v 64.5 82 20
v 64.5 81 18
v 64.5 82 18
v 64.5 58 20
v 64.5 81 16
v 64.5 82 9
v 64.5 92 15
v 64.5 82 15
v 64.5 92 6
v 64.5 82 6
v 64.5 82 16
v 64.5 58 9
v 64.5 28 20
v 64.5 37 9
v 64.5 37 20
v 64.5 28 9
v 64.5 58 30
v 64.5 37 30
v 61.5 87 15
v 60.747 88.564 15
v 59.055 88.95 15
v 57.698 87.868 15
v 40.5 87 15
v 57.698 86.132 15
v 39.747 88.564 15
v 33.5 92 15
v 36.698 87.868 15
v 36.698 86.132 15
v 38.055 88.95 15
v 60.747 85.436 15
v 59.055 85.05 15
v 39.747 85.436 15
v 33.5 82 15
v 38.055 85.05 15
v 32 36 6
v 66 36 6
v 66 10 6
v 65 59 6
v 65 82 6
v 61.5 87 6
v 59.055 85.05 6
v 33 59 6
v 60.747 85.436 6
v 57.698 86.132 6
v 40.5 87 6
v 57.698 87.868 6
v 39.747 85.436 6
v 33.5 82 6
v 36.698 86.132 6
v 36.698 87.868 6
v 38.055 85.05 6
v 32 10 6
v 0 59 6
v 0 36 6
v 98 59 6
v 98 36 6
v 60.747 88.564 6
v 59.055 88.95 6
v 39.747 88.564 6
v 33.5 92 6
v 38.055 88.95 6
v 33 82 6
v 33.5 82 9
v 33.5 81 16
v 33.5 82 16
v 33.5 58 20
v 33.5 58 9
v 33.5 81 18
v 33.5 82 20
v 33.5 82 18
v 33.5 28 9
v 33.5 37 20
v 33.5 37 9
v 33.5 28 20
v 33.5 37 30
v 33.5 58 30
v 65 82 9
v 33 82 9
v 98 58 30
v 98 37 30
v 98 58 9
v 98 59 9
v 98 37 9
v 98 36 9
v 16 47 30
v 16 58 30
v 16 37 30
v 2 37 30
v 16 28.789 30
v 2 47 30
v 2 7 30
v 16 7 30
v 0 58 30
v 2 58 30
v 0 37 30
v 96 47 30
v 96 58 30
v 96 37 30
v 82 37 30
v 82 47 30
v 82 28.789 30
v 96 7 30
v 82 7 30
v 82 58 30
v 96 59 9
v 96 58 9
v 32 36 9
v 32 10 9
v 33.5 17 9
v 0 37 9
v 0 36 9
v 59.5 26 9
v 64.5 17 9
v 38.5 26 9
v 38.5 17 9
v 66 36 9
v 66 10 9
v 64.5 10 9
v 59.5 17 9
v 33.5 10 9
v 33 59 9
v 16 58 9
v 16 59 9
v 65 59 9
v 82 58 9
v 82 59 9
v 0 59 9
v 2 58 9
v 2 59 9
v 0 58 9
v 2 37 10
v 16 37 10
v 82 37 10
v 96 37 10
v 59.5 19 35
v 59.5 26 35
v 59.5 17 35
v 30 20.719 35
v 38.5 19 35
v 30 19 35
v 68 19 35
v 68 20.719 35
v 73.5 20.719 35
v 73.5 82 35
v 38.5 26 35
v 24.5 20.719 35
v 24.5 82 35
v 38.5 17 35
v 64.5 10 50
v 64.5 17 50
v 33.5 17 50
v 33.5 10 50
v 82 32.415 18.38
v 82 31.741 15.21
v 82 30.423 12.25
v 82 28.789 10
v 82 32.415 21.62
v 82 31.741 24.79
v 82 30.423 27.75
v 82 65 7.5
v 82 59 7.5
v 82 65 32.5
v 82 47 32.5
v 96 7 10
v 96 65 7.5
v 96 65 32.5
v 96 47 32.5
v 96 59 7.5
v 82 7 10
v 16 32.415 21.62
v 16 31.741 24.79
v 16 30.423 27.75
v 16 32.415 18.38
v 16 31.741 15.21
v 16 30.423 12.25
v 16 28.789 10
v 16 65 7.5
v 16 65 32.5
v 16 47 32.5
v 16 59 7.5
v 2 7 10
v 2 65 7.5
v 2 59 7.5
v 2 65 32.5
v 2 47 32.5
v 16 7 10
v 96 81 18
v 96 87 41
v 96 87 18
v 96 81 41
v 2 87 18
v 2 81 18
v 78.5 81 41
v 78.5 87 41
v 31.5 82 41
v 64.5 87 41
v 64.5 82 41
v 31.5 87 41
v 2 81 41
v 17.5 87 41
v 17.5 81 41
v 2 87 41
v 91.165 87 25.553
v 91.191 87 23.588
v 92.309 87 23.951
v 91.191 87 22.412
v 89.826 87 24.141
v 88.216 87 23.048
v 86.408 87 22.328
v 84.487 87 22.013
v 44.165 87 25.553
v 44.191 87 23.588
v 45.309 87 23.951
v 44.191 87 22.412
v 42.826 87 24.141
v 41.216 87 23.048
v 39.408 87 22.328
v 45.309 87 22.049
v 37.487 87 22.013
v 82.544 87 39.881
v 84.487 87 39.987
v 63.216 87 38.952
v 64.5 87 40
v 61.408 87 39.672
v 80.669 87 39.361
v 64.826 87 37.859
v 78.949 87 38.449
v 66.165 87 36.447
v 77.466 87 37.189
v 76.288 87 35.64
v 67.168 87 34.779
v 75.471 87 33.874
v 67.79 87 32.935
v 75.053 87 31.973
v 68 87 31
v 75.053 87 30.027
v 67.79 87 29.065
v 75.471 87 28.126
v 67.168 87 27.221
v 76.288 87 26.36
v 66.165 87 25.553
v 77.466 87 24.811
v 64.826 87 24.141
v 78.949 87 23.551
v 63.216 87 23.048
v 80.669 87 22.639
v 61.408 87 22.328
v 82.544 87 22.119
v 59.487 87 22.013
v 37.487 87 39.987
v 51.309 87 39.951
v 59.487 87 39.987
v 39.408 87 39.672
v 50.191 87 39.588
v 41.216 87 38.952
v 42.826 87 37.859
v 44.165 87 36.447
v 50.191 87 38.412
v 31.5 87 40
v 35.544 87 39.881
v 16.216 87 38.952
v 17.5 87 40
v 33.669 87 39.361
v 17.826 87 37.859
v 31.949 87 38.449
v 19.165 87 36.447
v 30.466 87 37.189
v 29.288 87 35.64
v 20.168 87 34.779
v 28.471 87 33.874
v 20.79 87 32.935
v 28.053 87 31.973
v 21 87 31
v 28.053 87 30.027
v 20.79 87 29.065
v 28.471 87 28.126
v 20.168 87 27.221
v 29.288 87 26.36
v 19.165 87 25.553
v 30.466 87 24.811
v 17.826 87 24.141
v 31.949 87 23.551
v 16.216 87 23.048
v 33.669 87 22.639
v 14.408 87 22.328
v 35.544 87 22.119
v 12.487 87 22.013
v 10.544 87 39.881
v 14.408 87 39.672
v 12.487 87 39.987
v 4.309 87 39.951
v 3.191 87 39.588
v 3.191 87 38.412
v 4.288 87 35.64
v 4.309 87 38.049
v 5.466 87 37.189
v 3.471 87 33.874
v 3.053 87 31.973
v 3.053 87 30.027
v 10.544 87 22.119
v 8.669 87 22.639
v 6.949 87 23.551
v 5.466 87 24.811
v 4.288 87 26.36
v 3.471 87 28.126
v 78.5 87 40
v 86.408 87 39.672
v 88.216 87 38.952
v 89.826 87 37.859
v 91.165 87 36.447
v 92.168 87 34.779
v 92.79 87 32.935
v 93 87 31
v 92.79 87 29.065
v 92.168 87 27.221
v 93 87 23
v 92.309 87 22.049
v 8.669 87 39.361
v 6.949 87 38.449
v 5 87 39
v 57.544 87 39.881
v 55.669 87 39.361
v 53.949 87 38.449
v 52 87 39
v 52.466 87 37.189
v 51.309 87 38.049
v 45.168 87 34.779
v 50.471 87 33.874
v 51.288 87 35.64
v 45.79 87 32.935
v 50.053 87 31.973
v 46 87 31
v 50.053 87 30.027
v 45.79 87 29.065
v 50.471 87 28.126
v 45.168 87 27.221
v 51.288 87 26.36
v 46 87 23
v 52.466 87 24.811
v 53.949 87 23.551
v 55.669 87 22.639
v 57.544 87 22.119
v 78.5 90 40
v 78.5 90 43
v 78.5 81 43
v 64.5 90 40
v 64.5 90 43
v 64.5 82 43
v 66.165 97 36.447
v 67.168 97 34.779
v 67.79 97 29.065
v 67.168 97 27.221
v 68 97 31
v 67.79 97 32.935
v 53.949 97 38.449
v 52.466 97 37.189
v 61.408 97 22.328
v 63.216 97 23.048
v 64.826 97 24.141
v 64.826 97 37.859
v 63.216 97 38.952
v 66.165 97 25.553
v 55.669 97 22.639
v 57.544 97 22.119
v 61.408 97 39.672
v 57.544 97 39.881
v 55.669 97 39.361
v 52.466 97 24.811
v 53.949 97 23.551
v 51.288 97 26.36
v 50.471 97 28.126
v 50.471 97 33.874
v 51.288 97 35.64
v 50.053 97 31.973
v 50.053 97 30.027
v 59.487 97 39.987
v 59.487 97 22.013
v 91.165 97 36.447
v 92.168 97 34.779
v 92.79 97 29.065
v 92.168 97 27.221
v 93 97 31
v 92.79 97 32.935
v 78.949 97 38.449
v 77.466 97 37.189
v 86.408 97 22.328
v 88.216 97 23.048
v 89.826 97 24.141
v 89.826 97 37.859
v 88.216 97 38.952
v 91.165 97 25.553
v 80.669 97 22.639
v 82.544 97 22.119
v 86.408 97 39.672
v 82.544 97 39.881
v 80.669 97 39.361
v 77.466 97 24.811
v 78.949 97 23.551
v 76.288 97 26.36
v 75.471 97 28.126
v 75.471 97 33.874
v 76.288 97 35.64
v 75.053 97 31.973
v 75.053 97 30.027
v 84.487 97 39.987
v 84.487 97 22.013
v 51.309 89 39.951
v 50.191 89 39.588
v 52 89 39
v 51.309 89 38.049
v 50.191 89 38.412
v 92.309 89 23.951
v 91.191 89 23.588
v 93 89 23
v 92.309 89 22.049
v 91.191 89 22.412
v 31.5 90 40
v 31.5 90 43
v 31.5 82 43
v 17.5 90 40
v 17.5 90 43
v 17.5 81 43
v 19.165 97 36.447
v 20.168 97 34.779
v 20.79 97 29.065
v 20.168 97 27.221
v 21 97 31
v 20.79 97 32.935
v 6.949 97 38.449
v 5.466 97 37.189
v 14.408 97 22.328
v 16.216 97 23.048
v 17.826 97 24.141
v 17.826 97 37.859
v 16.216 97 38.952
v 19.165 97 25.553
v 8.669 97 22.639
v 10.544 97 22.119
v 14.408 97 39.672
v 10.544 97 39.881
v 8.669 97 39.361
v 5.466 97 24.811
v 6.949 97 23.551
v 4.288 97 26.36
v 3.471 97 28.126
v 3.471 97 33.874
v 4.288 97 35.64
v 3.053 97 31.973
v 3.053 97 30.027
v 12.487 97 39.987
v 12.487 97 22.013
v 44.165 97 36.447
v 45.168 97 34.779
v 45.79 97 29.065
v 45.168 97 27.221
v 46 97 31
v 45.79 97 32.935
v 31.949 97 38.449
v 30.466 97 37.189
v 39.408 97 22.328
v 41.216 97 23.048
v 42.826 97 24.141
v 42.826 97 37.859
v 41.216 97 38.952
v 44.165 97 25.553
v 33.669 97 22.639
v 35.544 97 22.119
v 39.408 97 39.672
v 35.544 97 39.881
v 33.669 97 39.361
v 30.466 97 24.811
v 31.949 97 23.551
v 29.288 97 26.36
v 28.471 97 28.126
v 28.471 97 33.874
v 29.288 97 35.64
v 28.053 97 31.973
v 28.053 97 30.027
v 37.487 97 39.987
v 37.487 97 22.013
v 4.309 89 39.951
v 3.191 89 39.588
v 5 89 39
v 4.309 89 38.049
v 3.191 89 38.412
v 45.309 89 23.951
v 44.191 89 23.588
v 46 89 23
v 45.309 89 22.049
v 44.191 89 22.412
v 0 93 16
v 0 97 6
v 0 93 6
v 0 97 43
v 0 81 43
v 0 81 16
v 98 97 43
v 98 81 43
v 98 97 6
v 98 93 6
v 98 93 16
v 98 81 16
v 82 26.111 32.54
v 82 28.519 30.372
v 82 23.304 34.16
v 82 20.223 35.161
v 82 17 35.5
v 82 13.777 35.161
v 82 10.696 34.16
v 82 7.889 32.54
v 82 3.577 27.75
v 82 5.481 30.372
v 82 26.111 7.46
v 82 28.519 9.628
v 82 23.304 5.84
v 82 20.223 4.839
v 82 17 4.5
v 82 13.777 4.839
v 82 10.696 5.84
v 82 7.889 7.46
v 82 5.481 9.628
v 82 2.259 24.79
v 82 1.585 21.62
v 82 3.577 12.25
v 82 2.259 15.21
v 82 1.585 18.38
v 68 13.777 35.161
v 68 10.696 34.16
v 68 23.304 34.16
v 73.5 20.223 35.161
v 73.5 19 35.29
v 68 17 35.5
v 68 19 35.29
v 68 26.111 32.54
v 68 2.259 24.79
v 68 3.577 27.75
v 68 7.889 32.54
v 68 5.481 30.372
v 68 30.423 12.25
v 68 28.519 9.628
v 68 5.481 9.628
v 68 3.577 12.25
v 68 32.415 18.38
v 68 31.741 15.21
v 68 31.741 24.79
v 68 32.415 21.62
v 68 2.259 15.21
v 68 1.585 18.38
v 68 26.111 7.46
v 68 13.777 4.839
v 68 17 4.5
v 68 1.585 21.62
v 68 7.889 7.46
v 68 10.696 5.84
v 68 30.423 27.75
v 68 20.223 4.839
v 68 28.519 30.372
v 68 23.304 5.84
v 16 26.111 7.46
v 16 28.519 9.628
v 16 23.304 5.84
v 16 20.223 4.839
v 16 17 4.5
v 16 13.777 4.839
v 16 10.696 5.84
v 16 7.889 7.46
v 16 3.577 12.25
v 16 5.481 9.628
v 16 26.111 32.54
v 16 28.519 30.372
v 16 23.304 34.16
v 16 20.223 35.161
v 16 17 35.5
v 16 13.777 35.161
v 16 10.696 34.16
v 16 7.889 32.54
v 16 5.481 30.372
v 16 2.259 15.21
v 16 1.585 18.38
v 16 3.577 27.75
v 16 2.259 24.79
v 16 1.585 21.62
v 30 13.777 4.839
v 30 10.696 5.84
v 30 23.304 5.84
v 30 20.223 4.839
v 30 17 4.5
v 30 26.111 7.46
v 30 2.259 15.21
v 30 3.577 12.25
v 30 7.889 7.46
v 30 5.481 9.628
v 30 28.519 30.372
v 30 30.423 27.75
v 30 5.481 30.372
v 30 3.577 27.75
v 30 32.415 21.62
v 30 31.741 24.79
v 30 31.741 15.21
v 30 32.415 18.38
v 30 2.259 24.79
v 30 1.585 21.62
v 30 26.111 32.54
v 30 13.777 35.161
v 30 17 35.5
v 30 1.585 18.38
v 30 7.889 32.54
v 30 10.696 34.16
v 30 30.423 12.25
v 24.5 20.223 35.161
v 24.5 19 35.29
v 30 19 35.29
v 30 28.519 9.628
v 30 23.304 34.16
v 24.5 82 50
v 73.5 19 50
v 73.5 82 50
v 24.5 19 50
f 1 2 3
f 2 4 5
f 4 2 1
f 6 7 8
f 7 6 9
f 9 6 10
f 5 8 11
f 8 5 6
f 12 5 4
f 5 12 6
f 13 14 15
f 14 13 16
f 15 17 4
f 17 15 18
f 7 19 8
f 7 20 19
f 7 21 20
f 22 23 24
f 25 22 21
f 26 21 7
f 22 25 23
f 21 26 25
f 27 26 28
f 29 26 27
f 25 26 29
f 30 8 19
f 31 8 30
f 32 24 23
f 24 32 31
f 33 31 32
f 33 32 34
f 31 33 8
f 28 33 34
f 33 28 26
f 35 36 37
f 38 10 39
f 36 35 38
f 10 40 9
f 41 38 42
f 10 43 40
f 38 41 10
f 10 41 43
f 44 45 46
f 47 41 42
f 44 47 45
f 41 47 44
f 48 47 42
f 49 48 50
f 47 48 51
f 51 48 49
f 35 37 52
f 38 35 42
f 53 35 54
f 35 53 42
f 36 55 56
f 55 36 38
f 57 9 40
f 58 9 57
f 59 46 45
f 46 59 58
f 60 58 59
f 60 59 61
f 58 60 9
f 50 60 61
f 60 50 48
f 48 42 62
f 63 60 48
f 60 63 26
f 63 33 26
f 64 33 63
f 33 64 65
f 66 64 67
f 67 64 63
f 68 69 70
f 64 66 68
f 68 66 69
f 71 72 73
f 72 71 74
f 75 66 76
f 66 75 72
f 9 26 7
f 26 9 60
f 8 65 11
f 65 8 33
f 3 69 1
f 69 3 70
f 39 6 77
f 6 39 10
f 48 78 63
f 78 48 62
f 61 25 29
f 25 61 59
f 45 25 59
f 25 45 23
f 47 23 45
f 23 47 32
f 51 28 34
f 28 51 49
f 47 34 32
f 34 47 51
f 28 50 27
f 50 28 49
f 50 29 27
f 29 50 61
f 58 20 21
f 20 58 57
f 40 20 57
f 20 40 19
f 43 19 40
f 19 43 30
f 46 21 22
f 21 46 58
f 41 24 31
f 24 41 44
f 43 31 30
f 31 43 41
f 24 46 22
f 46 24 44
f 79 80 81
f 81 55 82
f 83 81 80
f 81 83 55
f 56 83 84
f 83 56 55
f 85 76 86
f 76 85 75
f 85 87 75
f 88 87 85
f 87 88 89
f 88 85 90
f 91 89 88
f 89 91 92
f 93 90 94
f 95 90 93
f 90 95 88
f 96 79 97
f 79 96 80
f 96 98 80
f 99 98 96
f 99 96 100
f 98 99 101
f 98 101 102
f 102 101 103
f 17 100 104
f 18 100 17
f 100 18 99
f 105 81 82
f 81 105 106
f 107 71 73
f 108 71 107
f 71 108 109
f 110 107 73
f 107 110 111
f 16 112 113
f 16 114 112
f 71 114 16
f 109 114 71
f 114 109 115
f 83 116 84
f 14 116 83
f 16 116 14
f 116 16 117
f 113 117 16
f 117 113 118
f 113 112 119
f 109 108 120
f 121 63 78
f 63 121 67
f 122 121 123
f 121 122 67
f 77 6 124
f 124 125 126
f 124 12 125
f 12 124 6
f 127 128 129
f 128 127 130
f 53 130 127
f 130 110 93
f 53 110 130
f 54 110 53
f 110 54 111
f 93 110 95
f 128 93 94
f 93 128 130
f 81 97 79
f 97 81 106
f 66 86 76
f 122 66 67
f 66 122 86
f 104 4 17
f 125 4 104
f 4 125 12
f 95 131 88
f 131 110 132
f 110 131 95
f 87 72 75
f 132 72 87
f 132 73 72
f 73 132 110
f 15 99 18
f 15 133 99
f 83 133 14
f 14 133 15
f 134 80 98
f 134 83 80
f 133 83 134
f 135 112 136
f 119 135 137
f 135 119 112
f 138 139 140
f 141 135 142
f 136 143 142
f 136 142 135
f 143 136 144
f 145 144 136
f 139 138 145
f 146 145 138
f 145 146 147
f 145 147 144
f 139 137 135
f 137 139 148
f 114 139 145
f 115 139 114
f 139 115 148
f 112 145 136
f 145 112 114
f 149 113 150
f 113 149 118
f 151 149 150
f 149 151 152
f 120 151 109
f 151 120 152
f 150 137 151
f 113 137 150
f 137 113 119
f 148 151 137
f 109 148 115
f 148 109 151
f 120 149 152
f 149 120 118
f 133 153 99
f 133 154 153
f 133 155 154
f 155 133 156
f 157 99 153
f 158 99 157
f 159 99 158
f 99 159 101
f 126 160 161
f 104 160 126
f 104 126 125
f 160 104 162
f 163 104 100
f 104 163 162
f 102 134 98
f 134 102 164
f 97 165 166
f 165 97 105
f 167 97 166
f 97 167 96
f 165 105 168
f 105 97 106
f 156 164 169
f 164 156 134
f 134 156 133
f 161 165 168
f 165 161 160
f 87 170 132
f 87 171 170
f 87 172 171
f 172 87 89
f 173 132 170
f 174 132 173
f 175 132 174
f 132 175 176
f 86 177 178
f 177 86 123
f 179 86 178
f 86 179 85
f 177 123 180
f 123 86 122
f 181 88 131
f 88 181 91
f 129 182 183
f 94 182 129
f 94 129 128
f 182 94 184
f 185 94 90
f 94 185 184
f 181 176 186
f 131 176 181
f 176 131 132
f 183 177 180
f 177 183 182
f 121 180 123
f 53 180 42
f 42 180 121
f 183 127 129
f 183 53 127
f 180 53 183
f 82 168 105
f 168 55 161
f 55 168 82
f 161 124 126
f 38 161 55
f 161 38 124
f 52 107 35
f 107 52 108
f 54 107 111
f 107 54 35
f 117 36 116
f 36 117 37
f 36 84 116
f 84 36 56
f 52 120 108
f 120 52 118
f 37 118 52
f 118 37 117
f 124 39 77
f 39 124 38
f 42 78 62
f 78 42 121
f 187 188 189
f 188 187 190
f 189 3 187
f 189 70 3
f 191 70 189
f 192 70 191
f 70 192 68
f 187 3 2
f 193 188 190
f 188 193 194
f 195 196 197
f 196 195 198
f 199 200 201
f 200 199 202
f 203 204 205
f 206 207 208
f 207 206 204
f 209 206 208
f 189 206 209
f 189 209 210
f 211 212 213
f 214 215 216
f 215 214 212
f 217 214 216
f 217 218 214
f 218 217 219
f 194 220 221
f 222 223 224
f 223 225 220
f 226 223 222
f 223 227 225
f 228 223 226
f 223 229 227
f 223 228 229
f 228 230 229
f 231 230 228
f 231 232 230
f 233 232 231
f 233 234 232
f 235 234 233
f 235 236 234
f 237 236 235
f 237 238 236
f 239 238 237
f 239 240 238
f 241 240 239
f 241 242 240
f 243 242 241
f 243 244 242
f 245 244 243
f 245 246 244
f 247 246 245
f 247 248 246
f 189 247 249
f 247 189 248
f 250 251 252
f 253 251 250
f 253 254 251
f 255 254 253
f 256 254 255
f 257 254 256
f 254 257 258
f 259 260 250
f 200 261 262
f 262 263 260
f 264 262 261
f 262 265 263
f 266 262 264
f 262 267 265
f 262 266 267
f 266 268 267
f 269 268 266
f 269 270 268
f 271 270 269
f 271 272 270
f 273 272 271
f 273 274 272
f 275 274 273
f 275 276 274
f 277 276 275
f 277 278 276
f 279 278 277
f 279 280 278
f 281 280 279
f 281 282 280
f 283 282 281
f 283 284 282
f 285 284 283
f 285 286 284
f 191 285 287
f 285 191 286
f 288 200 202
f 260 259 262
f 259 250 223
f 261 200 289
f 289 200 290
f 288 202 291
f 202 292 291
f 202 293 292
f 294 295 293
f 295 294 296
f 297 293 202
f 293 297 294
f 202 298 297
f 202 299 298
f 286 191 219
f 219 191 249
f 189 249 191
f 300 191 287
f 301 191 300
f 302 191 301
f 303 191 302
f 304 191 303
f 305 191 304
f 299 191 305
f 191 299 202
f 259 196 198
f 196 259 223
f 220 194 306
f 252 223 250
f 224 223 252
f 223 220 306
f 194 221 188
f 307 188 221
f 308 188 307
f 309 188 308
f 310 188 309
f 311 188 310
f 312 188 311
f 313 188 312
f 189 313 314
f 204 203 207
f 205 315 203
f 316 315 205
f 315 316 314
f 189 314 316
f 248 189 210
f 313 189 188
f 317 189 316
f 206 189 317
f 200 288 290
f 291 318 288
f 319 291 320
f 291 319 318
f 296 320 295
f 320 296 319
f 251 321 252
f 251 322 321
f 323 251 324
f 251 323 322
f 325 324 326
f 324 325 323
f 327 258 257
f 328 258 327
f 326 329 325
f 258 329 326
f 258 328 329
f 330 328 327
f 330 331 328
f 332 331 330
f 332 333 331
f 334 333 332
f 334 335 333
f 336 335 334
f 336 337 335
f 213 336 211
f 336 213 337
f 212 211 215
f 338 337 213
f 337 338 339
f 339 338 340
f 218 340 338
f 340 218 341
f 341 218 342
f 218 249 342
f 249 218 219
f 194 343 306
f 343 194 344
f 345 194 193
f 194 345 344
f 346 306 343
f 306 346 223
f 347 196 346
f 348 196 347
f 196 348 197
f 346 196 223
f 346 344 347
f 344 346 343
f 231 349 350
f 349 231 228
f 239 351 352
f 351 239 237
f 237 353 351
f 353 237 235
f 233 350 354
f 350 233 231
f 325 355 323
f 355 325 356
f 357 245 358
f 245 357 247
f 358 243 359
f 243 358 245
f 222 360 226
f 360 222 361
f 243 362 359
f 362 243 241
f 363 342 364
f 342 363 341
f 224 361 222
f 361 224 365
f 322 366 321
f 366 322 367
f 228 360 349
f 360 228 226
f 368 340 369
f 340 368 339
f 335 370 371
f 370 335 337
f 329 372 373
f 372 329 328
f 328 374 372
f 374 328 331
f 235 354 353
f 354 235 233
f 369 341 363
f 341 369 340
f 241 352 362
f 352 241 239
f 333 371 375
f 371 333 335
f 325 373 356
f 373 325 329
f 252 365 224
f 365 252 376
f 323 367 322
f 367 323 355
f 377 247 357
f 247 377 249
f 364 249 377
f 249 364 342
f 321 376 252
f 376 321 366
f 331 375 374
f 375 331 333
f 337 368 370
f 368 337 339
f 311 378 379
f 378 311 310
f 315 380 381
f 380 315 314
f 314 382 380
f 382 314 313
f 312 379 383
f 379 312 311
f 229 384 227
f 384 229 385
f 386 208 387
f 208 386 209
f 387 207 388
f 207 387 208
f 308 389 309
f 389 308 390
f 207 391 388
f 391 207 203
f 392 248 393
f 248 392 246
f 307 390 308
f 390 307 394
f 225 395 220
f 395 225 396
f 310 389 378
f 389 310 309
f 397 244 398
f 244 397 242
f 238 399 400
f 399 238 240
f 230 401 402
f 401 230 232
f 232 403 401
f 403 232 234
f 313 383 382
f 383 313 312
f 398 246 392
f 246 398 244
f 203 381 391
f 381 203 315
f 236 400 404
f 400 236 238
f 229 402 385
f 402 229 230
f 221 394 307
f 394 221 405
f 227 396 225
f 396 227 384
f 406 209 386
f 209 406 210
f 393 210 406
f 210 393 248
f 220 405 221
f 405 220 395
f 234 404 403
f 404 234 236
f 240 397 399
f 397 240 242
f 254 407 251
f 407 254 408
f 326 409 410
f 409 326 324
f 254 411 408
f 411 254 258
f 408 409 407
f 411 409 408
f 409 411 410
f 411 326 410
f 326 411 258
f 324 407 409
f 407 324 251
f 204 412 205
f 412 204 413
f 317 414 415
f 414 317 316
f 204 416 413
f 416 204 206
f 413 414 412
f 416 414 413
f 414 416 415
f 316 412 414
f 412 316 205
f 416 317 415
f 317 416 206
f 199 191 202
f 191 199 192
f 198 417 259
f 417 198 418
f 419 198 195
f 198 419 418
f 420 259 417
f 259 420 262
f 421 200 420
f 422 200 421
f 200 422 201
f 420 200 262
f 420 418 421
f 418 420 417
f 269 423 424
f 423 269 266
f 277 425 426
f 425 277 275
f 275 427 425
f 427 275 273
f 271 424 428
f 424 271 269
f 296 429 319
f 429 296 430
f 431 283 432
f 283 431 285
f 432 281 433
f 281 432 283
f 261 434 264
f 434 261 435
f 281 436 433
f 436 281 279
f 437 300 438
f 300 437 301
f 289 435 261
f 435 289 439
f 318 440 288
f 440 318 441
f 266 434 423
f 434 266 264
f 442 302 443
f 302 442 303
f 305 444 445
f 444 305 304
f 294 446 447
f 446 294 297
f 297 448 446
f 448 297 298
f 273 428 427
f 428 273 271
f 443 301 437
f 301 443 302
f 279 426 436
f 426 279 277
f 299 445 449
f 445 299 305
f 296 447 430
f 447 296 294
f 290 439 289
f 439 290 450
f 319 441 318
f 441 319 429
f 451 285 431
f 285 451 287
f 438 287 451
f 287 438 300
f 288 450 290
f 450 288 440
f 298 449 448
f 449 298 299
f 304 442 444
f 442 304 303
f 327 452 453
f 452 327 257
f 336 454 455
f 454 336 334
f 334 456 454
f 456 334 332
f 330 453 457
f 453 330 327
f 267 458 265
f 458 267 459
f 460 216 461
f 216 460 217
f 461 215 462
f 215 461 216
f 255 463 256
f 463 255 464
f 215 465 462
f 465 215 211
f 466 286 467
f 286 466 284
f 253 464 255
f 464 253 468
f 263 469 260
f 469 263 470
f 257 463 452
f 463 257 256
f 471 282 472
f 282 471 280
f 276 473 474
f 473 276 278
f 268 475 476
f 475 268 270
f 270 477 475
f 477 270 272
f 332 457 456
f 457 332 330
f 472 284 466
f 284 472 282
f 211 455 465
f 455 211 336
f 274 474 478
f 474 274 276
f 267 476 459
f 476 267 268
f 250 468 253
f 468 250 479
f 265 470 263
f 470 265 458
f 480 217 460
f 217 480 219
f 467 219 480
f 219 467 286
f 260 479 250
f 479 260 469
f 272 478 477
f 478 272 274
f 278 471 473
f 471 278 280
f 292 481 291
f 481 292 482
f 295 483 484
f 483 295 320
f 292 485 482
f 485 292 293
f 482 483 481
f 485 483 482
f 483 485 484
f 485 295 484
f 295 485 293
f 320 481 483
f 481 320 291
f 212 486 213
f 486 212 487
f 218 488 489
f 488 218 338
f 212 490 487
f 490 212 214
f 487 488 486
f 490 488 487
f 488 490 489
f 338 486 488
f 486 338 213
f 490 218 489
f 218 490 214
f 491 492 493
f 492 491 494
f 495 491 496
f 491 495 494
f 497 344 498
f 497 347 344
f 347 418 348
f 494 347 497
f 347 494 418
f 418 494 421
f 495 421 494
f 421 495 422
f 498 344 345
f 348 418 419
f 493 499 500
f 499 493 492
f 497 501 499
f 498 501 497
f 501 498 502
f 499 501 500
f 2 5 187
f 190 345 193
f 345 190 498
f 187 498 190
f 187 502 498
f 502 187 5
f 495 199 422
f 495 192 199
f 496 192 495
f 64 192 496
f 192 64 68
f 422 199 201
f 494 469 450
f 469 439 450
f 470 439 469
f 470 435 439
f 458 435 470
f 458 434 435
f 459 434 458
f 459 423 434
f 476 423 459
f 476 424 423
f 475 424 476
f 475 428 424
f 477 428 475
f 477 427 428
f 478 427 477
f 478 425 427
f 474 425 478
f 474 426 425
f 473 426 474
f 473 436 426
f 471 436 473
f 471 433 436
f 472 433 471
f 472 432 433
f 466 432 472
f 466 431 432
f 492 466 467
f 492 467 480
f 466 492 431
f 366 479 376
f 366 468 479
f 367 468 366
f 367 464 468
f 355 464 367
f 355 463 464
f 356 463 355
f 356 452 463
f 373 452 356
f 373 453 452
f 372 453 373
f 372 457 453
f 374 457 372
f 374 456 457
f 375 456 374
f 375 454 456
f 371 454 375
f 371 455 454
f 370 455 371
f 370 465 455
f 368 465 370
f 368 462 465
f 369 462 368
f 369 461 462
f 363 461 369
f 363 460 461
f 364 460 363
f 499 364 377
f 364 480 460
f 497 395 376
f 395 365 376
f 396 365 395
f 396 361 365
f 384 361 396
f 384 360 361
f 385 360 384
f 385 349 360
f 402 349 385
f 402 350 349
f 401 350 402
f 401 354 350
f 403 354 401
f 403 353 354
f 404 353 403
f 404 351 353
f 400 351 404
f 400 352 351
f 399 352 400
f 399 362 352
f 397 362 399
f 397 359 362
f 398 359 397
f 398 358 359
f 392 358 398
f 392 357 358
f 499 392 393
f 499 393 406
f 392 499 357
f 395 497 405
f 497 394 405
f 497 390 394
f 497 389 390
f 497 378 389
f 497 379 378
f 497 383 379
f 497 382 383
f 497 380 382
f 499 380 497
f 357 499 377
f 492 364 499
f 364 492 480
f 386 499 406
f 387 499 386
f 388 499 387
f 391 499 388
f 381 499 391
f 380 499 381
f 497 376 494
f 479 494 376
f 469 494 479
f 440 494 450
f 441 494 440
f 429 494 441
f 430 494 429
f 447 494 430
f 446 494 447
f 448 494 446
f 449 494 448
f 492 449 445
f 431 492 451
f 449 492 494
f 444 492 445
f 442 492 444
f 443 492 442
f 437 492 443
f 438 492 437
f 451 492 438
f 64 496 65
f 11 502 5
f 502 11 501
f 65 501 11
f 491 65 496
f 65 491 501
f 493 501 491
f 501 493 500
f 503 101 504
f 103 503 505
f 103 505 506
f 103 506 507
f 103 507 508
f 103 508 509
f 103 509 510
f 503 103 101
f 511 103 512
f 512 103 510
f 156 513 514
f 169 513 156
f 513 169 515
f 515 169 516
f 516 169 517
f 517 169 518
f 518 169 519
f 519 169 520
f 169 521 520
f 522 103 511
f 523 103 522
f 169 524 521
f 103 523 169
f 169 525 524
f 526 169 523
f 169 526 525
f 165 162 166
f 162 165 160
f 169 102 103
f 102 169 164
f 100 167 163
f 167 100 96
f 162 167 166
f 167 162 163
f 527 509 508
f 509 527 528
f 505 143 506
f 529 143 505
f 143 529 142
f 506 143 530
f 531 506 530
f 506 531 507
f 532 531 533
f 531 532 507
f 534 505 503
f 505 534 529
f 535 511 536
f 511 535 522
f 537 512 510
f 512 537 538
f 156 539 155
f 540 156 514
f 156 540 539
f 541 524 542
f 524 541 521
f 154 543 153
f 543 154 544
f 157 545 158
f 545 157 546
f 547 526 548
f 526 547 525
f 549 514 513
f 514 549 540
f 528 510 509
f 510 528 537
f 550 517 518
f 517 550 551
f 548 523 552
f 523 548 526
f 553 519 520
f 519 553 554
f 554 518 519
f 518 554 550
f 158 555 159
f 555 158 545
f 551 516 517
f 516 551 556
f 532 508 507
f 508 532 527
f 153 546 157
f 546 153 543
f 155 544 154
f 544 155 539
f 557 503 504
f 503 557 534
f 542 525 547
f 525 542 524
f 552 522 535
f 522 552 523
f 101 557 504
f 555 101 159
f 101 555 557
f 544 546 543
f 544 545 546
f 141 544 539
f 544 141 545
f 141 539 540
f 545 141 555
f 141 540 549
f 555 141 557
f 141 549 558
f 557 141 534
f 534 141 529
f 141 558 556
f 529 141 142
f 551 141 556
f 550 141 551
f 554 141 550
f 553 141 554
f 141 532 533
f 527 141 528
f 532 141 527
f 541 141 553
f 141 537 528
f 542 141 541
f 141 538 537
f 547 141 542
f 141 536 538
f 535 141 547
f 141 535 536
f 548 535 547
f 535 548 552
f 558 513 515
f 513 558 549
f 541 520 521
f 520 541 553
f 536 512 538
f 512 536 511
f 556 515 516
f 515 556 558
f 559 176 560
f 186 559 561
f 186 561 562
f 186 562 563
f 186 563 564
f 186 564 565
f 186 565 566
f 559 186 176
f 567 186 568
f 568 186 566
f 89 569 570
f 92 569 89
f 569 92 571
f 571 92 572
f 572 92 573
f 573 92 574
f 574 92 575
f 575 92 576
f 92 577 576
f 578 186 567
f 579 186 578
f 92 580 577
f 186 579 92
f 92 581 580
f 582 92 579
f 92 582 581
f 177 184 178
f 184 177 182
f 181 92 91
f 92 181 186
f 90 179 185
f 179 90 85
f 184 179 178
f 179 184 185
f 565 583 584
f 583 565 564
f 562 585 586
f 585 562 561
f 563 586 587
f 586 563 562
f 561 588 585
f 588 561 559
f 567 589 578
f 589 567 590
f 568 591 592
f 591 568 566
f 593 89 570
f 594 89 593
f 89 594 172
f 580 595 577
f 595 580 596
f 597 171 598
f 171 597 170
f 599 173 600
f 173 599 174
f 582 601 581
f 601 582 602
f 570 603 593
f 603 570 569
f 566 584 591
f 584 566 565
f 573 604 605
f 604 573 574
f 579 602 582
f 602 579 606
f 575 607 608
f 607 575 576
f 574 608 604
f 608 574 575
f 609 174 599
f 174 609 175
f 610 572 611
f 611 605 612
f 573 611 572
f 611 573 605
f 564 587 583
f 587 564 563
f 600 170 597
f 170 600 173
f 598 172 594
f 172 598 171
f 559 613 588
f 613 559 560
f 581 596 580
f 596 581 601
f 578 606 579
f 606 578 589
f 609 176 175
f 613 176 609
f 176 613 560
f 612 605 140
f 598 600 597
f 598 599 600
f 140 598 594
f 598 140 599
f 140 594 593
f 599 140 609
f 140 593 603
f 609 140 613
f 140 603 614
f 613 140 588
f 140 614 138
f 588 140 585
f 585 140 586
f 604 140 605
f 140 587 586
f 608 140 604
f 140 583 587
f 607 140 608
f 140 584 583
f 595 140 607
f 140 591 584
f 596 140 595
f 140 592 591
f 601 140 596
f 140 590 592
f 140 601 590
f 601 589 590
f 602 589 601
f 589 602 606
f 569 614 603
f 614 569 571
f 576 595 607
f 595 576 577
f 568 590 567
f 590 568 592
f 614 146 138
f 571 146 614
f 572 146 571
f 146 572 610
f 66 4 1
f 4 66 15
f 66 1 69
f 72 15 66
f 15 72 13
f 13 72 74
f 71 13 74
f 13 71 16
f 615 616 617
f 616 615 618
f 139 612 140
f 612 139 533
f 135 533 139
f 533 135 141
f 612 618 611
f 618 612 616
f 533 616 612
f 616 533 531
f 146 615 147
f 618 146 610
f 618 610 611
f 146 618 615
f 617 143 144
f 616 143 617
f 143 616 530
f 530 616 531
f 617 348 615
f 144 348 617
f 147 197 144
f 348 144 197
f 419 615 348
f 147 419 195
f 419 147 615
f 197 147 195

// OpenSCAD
/* Hive13 SumoBot Chassis/Frame */

// The front plow takes up a depth of 16.
// Some space is used for linesensor screw holes ~14mm

max_w = 98;
max_d = 98 - 16;

batterypack_w = 63;
batterypack_h = 15;
batterypack_d = 49;

bpack2_w = 54;
bpack2_h = 11;
bpack2_d = 31;

micro_w = 70;
micro_h = 15; // We just go to the top of the shield
micro_d = 54;

frame_w = max_w;
frame_h = 3;
frame_d = max_d;

// tire + motor thickness ~30 
wheel_radius = 15.5;
wheel_thickness = 14;
motor_w =14;
motor_h = 58;
motor_d = 20;
lip_w = motor_w;
lip_h = 18;
lip_d = 25;
lip_dist_from_bottom_motor = 40;
tire_distance = 9;
offset_w =2;

linesensor_spacing = 18;
linesensor_depth = 23;
frame_wheel_d = 36;
wheel_clearance = 15;
backwall_thickness = 15;

// TEST WITH THE PLOW//
/* Hive13 SumoBot Plow */ 
/* aka Mr. Plow */
plowwidth = 98;
plowheight = 37;
plowdepth = 16;
sonicwidth = 47;
sonicdepth = 20; // Used to cut out the back

module baseframe() {
	difference() {
		union() {
		   cube([frame_w, frame_d, frame_h]);
		   // mounting tabs
		   translate(v=[(frame_w - bpack2_d) /2, frame_d, 0]) {
			difference() {
			   cube([bpack2_d,10 , frame_h+6]);
			   translate(v=[5, 5, 0]) {
				   cylinder(r = 2, h=frame_h+6);
			   }
			   translate(v=[bpack2_d-5, 5, 0]) {
				   cylinder(r = 2, h=frame_h+6);
			   }
			}
		   }
		   //translate(v=[frame_w-linesensor_spacing-10, frame_d, 0]) {
			//difference() {
			//   cube([10, 10, frame_h]);
			 //  translate(v=[5, 5, 0]) {
			//	   cylinder(r = 2, h=frame_h);
			 //  }
			//}
		  // }
		   // Wheel/Motor holder block
		  difference() // subtract out overhangs and wire section
		  {//Motor holder both sides.....
			  translate(v = [0,frame_wheel_d+1,frame_h]) {
				cube([frame_w, frame_d -(frame_wheel_d + linesensor_depth)-2,motor_d-1+offset_w]);// replace batterypack_h + bpack2_h + micro_h by motor_d -1
			  }
			  // Removes space over motors
			 // translate(v = [2,frame_wheel_d+1,frame_h +bpack2_h]) {
			//	cube([motor_w, frame_d -(frame_wheel_d + linesensor_depth-1), batterypack_h + micro_h]);
			 // }
			  //translate(v = [frame_w-motor_w-2,frame_wheel_d+1,frame_h +bpack2_h]) {
			//	cube([motor_w, frame_d -(frame_wheel_d + linesensor_depth-1), batterypack_h + micro_h]);
			 // }
			  // Remove area over batterypacks
			  translate(v = [(frame_w + batterypack_d) / 2, frame_d-batterypack_w, frame_h+bpack2_h+wheel_clearance]) {
				  rotate([0,0,90]) {
					batterypack();
				  }
			}

			translate(v = [(frame_w + bpack2_d) /2,frame_d-bpack2_w,frame_h]) {
				  rotate([0,0,90]) {
					  //bpack2();
					 cube([bpack2_w, bpack2_d, bpack2_h+wheel_clearance]);
				  }
			}
			 translate(v = [(frame_w - micro_d) / 2, frame_d-batterypack_w, frame_h+bpack2_h+batterypack_h+wheel_clearance]) {
				   cube([micro_d, batterypack_w, 40]);
			}

		  }
		  // Backwall
		  translate(v=[(frame_w + bpack2_d+10) /2-bpack2_d,frame_d-bpack2_w-backwall_thickness-2,frame_h]) {
			cube([bpack2_d-10, backwall_thickness, bpack2_h+wheel_clearance]);
		  }
		  // Backwall second piece
		  translate(v = [(frame_w + bpack2_d)/2-bpack2_d,10,frame_h]) {
			cube([bpack2_d, 7, bpack2_h+micro_h+batterypack_h]);
		  }
		} // union


		// Remove linesensor area
		translate(v = [0,frame_d-linesensor_depth,0]) {
			cube([linesensor_spacing, linesensor_depth, frame_h]);
		}
		translate(v = [frame_w - linesensor_spacing,frame_d-linesensor_depth,0]) {
			cube([linesensor_spacing, linesensor_depth, frame_h]);
		}
		// Remove tires
		translate(v = [0,0,0]) {
			cube([motor_w + wheel_thickness + 4, frame_wheel_d, frame_h]);
		}
		translate(v = [frame_w-motor_w-wheel_thickness-4,0,0]) {
			cube([motor_w + wheel_thickness + 4, frame_wheel_d, frame_h]);
		}
		// Remove unneeded space in the back
		translate(v =[(frame_w + bpack2_d-5) /2-bpack2_d,0,0]) {
			cube([bpack2_d+10, 10, frame_h]);
		}
                // Remove a hole for power switch
                translate(v = [frame_w-linesensor_spacing-15,frame_d-linesensor_depth,0]) {
                        cube([15, 23, frame_h]);
                }
		// This one is mainly for looks
		translate(v = [linesensor_spacing,frame_d-linesensor_depth,0]) {
			cube([15, 23, frame_h]);
		}
		// Remove the wheels
		// Right Tire
		translate(v = [max_w-2, 7,-motor_d+22+offset_w]) {
			rotate(a = [270, 180, 0]) {
				motor();
			}
		}
		// Left Tire
		translate(v = [2, 7, 22+offset_w]) {
			rotate(a = [270, 0, 0]) {
				motor();
			}
		}

	} // difference
}

module batterypack() {
  color([0, 127, 127, 255]) {
   cube([batterypack_w, batterypack_d, batterypack_h]);
  }
}

module bpack2() {
  color([127,127,0,255]) {
   cube([bpack2_w, bpack2_d, bpack2_h]);
  }
}

module micro() {
   cube([micro_w, micro_d, micro_h]);
}

module motor() {
  color([0,0,0,255]) {
     union() {
	   cube([motor_w, motor_d, motor_h]);
	  // Lip
	translate(v = [0, -(lip_d-motor_d)/2, lip_dist_from_bottom_motor]) {
		cube([lip_w, lip_d, lip_h]);
          }
	// wheel
         translate(v = [motor_w,motor_d/2,motor_d/2]) {
	    rotate(a = [90, 0, 90]) {
		cylinder(r = wheel_radius, h = wheel_thickness);
	    }
	}
      }
  }
}


module sonicsensor() { 
cube([sonicwidth,sonicdepth,23]);
translate(v = [15.5,-3,-9]) {
cube([14,sonicdepth+3,10]);
}
translate(v = [10, 1, 10]) {
rotate(a = [90,0,0]) {
cylinder(r = 9, h=16);
}
}
translate(v = [35, 1, 10]) {
rotate(a = [90,0,0]) {
cylinder(r = 9, h=16);
}
}
// Screw holes
translate(v = [2,1,2]) {
rotate(a = [90,0,0]) {
cylinder(r = 1, h=3);
}
}
translate(v = [43,1,18]) {
rotate(a = [90,0,0]) {
cylinder(r = 1, h=3);
}
}
}

module linesensor() {
cube([36, 12, 10]);

/* Remvoe screw hole 
translate(v = [14,5,10]) {
cylinder(r = 1,5, h=2);
}
*/

}

module plow() {

//difference() {

cube([plowwidth,plowdepth,plowheight]);

// add lip for line sensor
// translate(v = [2,plowdepth,10]){
// cube([12, 8,2]);
// }
//translate(v = [plowwidth-14,plowdepth,10]){
// cube([12, 8,2]);
//}

/* Remove curve - not working well 
rotate(a = [0,90,0]) {
translate(v = [-4, 0, -1]) {
cylinder(r =4, h=plowwidth+2);
}
}
translate(v = [-1, -6, 4]) {
cube([plowwidth+2,10,40]);
}
}
*/
}




translate(v =[0,0,6]) {
	baseframe();
}





// Main Object Section
// Lay on front for printing
translate(v=[frame_w,97,6]) {
rotate(a = [0,0,180]) {
difference() {
plow();


//translate(v = [14, 4, 0]) {
// rotate(a = [0, 0, 90]) {
// linesensor();
// }
//}
//translate(v = [plowwidth-2, 4, 0]) {
// rotate(a = [0, 0, 90]) {
// linesensor();
// }
//}

rotate(a = [0,180,0]) {
translate(v = [-sonicwidth-2, 10, -plowheight+2]) {
sonicsensor();
}
}


rotate(a = [0, 180, 0]) {
translate(v = [-plowwidth+2, 10, -plowheight+2]) {
sonicsensor();
}
}

// Remove un-needed plastic
translate(v = [0, 4, 0]) {
cube([plowwidth, 20, 10]);
}
translate(v = [2,10,plowheight-25]) {
cube([plowwidth-4, 20, 23]);
}

}
}
}



















//****************** NOT USED**********************//

//max base
//cube([max_w, max_d, 1]);

// Right Tire
translate(v = [max_w-2, 7,-motor_d+22+offset_w+6]) {
	rotate(a = [270, 180, 0]) {
		motor();
	}
}
// Left Tire
translate(v = [2, 7, 22+offset_w+6]) {
	rotate(a = [270, 0, 0]) {
		motor();
	}
}

translate(v = [(frame_w + bpack2_d) /2,frame_d-bpack2_w,frame_h+6]) {
  rotate([0,0,90]) {
	  bpack2();
  }
}

translate(v = [(frame_w + batterypack_d) / 2, frame_d-batterypack_w, frame_h+6+bpack2_h+wheel_clearance]) {
  rotate([0,0,90]) {
	batterypack();
  }
}
